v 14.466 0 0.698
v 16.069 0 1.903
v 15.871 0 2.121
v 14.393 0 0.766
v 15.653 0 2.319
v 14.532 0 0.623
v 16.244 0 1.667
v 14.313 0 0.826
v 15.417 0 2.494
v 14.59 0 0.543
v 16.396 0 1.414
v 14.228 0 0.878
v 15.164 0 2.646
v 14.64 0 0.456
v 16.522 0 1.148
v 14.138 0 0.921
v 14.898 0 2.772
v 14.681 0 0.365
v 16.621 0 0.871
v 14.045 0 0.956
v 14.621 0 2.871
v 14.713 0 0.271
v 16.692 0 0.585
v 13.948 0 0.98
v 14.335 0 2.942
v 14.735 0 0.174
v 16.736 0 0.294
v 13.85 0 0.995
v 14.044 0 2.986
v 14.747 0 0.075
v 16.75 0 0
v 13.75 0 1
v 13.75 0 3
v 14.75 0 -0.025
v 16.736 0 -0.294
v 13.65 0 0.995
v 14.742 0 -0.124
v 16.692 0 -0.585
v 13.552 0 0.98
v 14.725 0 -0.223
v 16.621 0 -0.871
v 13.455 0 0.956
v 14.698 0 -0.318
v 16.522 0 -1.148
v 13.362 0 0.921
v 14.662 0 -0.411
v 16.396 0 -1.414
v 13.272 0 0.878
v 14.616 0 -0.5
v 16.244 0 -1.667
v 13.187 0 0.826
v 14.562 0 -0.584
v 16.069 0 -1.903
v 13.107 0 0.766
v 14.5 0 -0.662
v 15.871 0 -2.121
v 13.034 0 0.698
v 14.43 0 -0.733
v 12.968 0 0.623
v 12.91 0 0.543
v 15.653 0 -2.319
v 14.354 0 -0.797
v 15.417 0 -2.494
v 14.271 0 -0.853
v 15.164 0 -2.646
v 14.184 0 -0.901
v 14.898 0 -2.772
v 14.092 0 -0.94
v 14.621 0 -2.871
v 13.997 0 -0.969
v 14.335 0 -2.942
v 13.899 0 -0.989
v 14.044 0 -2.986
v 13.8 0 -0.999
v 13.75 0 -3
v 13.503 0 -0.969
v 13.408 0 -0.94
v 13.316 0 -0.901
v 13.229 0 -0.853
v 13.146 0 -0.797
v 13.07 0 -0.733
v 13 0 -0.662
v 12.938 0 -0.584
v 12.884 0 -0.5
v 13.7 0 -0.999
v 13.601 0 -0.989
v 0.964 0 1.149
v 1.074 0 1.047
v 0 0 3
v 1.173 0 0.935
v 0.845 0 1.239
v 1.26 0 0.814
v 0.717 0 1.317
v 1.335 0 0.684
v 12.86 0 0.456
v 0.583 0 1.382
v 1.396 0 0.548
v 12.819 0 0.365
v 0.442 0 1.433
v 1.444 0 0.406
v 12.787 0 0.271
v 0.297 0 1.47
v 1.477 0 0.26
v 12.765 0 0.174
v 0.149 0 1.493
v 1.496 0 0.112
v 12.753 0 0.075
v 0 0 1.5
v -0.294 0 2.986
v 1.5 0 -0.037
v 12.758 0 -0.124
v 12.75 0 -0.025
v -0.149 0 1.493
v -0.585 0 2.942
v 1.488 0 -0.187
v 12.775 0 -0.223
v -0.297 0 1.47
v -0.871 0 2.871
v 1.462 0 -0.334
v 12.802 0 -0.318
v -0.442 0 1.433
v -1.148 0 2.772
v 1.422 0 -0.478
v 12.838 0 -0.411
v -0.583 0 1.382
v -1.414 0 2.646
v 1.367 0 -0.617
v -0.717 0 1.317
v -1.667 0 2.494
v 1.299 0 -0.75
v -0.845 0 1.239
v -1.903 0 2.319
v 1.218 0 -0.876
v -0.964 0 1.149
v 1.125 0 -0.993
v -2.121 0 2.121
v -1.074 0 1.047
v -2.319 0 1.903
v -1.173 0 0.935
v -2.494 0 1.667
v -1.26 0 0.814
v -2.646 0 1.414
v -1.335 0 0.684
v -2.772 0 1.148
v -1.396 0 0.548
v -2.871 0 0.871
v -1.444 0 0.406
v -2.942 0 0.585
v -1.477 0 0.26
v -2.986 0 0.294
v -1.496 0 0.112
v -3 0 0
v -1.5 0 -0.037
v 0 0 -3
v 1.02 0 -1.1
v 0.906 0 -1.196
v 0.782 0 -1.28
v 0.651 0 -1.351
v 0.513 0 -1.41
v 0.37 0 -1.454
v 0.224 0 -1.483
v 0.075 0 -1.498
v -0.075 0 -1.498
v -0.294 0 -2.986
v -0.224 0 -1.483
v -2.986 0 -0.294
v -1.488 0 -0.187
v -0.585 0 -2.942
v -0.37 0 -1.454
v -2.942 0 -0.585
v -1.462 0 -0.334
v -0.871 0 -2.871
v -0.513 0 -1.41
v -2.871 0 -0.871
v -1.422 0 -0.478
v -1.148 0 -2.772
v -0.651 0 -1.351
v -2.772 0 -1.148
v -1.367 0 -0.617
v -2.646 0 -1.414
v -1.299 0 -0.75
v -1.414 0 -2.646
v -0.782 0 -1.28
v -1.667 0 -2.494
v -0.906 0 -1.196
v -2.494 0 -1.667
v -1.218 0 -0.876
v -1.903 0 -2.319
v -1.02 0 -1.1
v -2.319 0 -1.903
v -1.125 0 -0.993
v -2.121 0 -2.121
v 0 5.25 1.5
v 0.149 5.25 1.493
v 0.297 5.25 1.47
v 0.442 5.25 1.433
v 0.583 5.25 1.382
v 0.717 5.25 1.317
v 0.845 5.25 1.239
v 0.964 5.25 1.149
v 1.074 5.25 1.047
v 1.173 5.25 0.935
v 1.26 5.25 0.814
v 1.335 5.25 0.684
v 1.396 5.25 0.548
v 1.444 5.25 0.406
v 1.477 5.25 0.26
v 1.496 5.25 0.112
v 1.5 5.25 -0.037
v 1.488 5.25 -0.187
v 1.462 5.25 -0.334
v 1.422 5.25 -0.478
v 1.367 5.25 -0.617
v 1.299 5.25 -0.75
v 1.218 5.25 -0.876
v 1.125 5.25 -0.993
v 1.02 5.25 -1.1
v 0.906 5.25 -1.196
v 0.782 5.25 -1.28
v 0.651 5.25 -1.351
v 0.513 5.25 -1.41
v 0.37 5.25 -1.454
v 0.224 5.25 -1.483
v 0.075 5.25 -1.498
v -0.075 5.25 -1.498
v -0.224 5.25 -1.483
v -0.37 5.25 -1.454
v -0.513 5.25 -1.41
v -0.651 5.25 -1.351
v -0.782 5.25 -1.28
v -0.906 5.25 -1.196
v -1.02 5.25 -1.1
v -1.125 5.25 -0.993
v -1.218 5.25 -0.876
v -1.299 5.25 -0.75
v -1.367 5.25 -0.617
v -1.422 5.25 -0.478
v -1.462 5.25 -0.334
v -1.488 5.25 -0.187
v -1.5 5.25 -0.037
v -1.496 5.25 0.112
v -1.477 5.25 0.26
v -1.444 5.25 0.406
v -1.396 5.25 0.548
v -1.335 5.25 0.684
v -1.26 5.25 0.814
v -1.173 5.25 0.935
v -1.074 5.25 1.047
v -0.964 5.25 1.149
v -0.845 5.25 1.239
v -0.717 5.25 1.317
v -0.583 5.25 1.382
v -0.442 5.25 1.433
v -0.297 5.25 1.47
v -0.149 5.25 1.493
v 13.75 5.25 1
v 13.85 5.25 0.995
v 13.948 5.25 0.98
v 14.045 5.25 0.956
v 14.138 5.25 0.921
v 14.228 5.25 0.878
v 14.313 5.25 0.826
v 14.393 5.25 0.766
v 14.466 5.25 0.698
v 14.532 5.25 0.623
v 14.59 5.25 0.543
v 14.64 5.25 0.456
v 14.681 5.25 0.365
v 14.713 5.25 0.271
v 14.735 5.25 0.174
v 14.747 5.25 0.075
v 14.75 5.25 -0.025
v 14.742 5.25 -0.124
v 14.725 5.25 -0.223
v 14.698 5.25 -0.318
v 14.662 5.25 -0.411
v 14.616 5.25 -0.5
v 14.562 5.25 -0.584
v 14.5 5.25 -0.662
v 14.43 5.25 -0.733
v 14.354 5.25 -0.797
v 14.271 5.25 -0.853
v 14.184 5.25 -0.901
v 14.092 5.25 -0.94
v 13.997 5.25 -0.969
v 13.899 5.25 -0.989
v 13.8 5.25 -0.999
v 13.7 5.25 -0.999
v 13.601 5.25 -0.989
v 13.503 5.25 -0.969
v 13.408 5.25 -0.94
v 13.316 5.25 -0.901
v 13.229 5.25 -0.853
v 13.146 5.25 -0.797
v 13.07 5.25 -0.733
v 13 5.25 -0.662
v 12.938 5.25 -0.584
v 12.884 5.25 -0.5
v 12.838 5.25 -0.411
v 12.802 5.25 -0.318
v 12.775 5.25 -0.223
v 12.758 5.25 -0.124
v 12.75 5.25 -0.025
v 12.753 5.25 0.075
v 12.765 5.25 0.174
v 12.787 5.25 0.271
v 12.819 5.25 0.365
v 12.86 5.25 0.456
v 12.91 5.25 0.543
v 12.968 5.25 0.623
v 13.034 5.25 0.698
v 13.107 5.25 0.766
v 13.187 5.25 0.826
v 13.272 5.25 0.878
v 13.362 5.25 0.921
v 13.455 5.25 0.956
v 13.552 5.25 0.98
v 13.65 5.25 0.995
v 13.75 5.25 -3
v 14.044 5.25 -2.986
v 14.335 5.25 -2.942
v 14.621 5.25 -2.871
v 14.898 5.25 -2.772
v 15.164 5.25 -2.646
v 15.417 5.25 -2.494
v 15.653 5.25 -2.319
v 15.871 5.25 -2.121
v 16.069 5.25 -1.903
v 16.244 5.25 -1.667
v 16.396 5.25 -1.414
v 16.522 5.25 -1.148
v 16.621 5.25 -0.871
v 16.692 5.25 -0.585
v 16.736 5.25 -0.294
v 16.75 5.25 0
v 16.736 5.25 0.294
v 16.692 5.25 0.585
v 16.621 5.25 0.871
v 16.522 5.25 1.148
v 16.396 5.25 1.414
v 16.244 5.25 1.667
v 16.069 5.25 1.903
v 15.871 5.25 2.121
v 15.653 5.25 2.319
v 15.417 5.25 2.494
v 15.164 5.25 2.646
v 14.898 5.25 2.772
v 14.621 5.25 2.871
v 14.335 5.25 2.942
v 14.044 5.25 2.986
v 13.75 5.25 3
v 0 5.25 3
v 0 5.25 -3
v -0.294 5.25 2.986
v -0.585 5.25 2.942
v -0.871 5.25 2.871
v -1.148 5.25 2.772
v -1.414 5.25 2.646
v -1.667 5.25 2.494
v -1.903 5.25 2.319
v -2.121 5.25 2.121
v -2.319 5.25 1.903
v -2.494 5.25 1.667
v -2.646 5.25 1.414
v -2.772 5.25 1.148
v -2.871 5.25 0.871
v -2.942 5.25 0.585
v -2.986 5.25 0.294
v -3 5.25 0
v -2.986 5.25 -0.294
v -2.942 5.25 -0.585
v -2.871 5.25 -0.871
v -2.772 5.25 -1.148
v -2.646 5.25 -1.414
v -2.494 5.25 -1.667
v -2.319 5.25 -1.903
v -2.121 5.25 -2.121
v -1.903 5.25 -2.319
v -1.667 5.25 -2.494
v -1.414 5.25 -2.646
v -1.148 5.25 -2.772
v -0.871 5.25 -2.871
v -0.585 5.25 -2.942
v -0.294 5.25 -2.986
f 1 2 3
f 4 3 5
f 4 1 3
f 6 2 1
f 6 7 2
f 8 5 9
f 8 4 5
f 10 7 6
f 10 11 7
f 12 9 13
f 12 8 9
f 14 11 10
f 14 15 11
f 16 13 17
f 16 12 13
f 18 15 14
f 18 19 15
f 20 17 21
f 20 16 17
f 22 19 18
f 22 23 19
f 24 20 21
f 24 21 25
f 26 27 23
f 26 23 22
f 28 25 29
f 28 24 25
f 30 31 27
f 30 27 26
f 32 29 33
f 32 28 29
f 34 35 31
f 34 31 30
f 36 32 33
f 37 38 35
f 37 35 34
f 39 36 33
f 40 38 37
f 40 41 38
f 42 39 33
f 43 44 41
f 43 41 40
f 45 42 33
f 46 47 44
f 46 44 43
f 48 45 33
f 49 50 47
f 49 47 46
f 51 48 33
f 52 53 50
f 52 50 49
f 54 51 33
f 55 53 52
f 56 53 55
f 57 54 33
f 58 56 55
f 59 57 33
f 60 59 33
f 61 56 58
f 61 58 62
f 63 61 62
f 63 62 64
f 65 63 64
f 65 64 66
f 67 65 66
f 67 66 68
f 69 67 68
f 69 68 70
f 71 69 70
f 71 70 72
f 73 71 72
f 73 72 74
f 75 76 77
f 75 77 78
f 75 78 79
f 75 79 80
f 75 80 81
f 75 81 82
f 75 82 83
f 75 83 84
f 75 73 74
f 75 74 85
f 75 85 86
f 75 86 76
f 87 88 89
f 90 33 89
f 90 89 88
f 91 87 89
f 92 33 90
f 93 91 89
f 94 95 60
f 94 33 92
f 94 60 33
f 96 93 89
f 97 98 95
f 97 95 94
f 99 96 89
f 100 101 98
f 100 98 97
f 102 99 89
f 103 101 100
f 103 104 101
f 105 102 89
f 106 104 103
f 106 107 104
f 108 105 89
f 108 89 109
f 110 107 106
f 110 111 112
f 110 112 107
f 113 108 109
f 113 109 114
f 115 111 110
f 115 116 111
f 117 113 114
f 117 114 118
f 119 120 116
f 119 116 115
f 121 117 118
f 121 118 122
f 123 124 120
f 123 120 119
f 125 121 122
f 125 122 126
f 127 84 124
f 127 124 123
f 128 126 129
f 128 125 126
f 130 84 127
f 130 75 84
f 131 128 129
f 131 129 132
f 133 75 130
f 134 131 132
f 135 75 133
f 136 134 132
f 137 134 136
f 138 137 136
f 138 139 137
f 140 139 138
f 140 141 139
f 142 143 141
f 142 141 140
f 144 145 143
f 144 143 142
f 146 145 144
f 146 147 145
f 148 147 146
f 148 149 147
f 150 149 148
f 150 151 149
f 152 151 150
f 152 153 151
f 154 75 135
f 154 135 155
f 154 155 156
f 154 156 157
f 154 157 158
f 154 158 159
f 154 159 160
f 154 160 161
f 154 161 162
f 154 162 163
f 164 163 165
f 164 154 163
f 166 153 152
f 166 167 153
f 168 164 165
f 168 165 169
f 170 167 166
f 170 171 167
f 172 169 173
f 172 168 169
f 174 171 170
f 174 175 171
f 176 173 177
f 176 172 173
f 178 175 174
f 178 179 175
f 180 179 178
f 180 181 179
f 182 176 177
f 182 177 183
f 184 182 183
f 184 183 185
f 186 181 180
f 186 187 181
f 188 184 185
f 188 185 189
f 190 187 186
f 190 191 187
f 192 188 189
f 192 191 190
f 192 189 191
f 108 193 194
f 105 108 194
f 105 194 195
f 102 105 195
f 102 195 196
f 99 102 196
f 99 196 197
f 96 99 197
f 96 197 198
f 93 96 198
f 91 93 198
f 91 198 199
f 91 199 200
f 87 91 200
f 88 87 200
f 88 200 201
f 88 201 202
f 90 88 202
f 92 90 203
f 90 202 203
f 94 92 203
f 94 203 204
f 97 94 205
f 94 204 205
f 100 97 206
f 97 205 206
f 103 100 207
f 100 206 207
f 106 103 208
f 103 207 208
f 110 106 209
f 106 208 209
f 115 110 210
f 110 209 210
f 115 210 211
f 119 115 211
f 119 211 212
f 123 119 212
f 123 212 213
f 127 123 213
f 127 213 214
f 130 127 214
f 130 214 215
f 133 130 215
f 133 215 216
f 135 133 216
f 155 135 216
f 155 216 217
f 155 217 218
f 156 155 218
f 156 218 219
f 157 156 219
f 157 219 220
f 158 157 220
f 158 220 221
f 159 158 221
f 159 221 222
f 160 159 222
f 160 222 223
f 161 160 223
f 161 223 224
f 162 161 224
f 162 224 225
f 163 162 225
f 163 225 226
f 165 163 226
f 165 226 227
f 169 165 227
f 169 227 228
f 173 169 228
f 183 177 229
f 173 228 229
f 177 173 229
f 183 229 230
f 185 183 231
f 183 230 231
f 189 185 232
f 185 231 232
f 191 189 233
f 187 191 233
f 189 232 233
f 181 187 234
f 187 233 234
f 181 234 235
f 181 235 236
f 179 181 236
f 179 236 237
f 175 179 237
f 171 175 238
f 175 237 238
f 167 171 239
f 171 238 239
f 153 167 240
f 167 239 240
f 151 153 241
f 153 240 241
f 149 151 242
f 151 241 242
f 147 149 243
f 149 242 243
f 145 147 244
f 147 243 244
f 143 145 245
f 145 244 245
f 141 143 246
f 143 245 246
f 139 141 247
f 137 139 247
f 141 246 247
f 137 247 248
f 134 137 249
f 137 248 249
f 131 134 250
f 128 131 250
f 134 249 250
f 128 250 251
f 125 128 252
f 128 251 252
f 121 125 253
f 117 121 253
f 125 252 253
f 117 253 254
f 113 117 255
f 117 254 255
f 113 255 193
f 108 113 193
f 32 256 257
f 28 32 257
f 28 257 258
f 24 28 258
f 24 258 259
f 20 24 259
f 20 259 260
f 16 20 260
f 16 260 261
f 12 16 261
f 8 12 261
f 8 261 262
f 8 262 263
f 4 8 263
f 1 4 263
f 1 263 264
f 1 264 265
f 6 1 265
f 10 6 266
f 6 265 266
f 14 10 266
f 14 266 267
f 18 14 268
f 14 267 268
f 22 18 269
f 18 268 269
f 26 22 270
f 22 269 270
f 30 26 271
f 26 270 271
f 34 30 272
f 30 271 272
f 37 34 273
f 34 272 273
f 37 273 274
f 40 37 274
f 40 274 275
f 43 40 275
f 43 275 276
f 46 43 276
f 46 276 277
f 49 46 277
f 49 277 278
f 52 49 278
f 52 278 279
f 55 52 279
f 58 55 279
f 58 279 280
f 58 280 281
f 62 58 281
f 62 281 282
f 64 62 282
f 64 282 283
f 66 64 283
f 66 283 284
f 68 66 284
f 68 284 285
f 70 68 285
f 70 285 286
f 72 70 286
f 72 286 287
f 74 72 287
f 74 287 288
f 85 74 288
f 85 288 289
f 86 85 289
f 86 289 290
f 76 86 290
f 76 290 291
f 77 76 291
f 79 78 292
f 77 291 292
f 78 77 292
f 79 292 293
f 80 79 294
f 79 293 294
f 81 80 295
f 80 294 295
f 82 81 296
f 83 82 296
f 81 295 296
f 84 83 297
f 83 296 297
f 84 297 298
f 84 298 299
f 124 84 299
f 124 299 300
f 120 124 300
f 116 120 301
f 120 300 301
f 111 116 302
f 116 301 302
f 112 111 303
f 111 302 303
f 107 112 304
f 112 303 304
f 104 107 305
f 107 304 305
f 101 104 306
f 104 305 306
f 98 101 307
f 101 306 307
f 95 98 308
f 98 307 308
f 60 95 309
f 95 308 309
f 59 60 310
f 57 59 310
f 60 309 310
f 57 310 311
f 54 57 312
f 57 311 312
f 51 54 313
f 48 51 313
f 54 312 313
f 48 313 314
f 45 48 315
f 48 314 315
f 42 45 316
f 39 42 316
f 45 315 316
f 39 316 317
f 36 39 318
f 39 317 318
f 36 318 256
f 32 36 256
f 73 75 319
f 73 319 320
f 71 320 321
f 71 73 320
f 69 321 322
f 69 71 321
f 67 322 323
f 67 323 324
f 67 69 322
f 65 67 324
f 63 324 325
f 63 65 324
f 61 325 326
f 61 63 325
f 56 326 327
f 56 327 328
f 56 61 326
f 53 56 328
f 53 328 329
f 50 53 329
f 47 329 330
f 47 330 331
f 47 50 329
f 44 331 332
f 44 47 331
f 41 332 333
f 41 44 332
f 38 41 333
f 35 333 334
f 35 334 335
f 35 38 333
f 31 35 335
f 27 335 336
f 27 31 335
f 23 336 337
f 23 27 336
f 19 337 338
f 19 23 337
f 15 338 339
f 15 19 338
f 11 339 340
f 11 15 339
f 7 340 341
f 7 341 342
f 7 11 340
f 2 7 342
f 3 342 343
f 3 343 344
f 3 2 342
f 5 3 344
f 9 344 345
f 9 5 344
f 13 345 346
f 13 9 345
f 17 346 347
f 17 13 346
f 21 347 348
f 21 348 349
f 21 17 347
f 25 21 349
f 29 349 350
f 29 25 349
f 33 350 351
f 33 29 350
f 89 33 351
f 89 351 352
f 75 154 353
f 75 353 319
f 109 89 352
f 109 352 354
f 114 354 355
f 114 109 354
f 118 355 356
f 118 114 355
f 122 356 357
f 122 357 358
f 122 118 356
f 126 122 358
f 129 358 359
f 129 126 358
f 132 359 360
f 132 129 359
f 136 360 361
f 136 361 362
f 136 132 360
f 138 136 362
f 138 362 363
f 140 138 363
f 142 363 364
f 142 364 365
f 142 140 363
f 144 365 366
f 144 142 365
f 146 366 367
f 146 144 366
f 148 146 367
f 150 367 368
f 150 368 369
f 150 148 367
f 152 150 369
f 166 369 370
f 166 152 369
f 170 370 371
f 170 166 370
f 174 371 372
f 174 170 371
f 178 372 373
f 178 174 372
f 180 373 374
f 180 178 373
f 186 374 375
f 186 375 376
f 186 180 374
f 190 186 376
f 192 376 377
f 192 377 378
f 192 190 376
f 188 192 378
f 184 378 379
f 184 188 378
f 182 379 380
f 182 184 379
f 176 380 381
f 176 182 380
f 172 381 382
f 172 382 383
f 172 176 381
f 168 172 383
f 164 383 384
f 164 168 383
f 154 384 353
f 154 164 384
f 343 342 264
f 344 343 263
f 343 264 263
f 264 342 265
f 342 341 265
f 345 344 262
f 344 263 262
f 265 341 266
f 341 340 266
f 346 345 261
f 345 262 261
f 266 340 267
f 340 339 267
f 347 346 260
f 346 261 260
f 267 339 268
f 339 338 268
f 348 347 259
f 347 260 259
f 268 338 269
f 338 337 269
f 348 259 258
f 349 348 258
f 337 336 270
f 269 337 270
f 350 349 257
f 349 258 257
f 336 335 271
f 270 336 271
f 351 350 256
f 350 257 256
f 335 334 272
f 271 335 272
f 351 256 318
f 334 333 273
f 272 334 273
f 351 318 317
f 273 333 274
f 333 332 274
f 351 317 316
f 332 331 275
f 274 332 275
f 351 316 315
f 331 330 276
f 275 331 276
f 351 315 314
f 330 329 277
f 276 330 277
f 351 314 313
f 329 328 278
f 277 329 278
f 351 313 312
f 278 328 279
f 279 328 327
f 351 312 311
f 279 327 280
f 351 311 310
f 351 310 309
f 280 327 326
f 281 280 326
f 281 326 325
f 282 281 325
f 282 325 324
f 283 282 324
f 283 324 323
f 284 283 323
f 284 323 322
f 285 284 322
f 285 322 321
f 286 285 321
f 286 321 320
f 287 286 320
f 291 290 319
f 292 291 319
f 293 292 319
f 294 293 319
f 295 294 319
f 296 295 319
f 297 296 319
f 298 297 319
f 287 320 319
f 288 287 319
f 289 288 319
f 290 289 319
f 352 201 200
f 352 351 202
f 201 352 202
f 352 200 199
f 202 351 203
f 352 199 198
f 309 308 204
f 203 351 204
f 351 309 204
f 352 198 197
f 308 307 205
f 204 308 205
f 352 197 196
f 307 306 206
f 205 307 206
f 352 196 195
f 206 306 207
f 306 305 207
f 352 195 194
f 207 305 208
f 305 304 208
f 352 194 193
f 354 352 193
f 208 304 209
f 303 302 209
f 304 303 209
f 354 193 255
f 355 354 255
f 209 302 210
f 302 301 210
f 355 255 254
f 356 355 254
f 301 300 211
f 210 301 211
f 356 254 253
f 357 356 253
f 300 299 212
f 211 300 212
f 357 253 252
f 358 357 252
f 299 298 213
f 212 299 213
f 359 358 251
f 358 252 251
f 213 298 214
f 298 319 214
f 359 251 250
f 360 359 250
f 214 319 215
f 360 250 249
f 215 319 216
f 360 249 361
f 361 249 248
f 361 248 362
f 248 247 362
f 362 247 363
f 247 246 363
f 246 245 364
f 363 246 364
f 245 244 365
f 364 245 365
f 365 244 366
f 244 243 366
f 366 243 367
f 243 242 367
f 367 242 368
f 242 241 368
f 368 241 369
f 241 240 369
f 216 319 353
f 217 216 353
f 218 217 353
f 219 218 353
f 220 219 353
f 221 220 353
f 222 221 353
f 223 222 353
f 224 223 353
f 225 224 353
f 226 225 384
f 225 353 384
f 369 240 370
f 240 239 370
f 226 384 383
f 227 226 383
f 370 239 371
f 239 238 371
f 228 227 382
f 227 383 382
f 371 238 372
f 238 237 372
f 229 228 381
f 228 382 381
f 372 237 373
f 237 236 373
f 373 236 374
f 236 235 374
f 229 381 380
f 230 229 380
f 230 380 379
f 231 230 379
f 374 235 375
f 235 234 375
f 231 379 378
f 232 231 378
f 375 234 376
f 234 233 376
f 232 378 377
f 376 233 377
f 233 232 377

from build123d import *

# Parameters (mm, degrees)
EXTRUDE_1_DEPTH     = 5.25
CUT_EXTRUDE_1_REACH = 19.808
SKETCH_2_R          = 1.5
SKETCH_2_R_2        = 1


with BuildPart() as part:
    # 草图1 → 凸台-拉伸1 (new body)
    with BuildSketch(Plane(origin=(0, 0, 0), x_dir=(1, 0, 0), z_dir=(0, 1, 0))):
        with BuildLine():
            Line((0, 3), (13.75, 3))
            ThreePointArc((13.75, 3), (16.75, 0), (13.75, -3))
            Line((13.75, -3), (0, -3))
            ThreePointArc((0, -3), (-3, 0), (0, 3))
        make_face()
    extrude(amount=EXTRUDE_1_DEPTH)

    # 草图2 → 切除-拉伸1 (cut, up to next)
    with BuildSketch(Plane(origin=(0, 5.25, 0), x_dir=(1, 0, 0), z_dir=(0, 1, 0)), mode=Mode.PRIVATE) as cut_extrude_1_sk1:
        with Locations(Location((0, 0, 0), (0, 0, 270))):
            Circle(SKETCH_2_R)
    cut_extrude_1_tool1 = extrude(cut_extrude_1_sk1.sketch, amount=-CUT_EXTRUDE_1_REACH, mode=Mode.PRIVATE) & part.part
    # 草图2 → 切除-拉伸1 (cut, up to next)
    with BuildSketch(Plane(origin=(0, 5.25, 0), x_dir=(1, 0, 0), z_dir=(0, 1, 0)), mode=Mode.PRIVATE) as cut_extrude_1_sk2:
        with Locations(Location((13.75, 0, 0), (0, 0, 270))):
            Circle(SKETCH_2_R_2)
    cut_extrude_1_tool2 = extrude(cut_extrude_1_sk2.sketch, amount=-CUT_EXTRUDE_1_REACH, mode=Mode.PRIVATE) & part.part
    add(cut_extrude_1_tool1.solids().sort_by_distance((0, 5.25, 0))[0], mode=Mode.SUBTRACT)
    add(cut_extrude_1_tool2.solids().sort_by_distance((13.75, 5.25, 0))[0], mode=Mode.SUBTRACT)


solid = part.part
